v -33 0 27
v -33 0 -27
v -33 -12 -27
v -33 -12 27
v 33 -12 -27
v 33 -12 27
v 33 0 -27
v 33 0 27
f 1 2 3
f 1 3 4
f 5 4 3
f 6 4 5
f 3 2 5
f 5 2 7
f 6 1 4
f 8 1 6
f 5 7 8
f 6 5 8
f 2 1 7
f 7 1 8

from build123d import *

# Parameters (mm, degrees)
F0_W      = 210
F0_H      = 54
F1_DEPTH  = 12
F3_W      = 90
F3_H      = 68
F4_DEPTH  = 12
F6_W      = 90
F6_H      = 54
F7_DEPTH  = 12
F9_W      = 66
F9_H      = 54
F10_DEPTH = 12


with BuildPart() as f1:
    # F0 (on Front) → F1 (new body)
    with BuildSketch(Plane.XZ):
        with Locations((3.5633459853, 0)):
            Rectangle(F0_W, F0_H)
    extrude(amount=F1_DEPTH)


with BuildPart() as f4:
    # F3 (on Front) → F4 (new body)
    with BuildSketch(Plane.XZ):
        with Locations((0, -2.5499821276)):
            Rectangle(F3_W, F3_H)
    extrude(amount=F4_DEPTH)


with BuildPart() as f7:
    # F6 (on Front) → F7 (new body)
    with BuildSketch(Plane.XZ):
        Rectangle(F6_W, F6_H)
    extrude(amount=F7_DEPTH)


with BuildPart() as f10:
    # F9 (on Front) → F10 (new body)
    with BuildSketch(Plane.XZ):
        Rectangle(F9_W, F9_H)
    extrude(amount=F10_DEPTH)


solid = f10.part
